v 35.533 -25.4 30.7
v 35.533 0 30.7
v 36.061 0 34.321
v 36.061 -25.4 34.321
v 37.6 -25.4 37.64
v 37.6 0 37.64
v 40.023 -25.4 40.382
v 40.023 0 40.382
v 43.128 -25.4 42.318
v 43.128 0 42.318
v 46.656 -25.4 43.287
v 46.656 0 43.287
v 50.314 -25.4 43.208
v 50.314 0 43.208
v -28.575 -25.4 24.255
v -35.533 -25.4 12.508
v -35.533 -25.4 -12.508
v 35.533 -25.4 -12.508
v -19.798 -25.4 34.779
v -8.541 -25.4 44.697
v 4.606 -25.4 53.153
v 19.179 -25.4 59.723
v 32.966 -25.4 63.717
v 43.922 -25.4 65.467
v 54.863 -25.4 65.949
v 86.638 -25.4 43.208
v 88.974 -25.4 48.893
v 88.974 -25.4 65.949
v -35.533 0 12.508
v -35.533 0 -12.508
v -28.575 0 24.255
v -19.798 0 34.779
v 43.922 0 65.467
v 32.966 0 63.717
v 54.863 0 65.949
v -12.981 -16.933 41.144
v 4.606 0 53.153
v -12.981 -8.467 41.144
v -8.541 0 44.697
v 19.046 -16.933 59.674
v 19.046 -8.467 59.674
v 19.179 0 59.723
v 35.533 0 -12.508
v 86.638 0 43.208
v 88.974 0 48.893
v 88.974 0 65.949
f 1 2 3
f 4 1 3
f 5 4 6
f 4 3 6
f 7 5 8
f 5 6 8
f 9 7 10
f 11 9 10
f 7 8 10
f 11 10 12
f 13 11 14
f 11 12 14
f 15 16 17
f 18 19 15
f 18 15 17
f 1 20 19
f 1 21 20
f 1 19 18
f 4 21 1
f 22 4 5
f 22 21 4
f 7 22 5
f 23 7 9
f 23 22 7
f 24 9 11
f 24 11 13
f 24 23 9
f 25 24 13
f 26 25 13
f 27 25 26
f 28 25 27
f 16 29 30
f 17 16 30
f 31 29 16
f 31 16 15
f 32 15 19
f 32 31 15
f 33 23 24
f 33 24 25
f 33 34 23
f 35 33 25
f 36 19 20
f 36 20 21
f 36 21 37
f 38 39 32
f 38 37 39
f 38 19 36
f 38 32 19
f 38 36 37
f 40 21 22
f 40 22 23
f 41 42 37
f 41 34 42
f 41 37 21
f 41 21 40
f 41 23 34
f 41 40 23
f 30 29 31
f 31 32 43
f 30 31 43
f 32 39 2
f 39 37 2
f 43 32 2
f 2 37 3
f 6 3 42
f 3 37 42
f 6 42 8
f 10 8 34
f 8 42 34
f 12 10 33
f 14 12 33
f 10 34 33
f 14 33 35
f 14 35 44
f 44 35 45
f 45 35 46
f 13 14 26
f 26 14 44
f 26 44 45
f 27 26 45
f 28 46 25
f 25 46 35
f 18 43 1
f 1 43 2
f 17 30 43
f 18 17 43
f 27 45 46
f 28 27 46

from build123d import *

# Parameters (mm, degrees)
F1_DEPTH = 25.4


with BuildPart() as f1:
    # F0 (on Front) → F1 (new body)
    with BuildSketch(Plane.XZ):
        Polygon((88.974215, 65.948948), (54.8627, 65.948948), (54.8627, 58.892507), (54.8627, 48.893191), (88.974215, 48.893191), align=None)
        with BuildLine():
            Line((19.848254, 12.507557), (35.532828, 12.507557))
            Line((35.532828, 12.507557), (35.532828, 30.700376))
            ThreePointArc((35.532828, 30.700376), (40.023166, 40.382017), (50.314497, 43.207932))
            Line((50.314497, 43.207932), (86.637879, 43.207932))
            Line((86.637879, 43.207932), (88.974215, 48.893191))
            Line((88.974215, 48.893191), (54.8627, 48.893191))
            Line((54.8627, 48.893191), (54.8627, 58.892507))
            Line((54.8627, 58.892507), (51.360797, 58.892507))
            ThreePointArc((51.360797, 58.892507), (29.301535, 51.841785), (19.848254, 30.700376))
            Line((19.848254, 30.700376), (19.848254, 12.507557))
        make_face()
        with BuildLine():
            add(Edge.make_bspline(
                [(-35.532828, 12.507557), (-19.614134, 45.482036), (19.045593, 66.51748), (54.8627, 65.948948)],
                knots=[0, 0, 0, 0, 105.011113, 105.011113, 105.011113, 105.011113], degree=3))
            Line((-35.532828, 12.507557), (19.848254, 12.507557))
            Line((19.848254, 12.507557), (19.848254, 30.700376))
            ThreePointArc((19.848254, 30.700376), (29.301535, 51.841785), (51.360797, 58.892507))
            Line((51.360797, 58.892507), (54.8627, 58.892507))
            Line((54.8627, 58.892507), (54.8627, 65.948948))
        make_face()
        Polygon((-35.532828, -12.507557), (35.532828, -12.507557), (35.532828, 12.507557), (19.848254, 12.507557), (-35.532828, 12.507557), align=None)
    extrude(amount=F1_DEPTH)


solid = f1.part
